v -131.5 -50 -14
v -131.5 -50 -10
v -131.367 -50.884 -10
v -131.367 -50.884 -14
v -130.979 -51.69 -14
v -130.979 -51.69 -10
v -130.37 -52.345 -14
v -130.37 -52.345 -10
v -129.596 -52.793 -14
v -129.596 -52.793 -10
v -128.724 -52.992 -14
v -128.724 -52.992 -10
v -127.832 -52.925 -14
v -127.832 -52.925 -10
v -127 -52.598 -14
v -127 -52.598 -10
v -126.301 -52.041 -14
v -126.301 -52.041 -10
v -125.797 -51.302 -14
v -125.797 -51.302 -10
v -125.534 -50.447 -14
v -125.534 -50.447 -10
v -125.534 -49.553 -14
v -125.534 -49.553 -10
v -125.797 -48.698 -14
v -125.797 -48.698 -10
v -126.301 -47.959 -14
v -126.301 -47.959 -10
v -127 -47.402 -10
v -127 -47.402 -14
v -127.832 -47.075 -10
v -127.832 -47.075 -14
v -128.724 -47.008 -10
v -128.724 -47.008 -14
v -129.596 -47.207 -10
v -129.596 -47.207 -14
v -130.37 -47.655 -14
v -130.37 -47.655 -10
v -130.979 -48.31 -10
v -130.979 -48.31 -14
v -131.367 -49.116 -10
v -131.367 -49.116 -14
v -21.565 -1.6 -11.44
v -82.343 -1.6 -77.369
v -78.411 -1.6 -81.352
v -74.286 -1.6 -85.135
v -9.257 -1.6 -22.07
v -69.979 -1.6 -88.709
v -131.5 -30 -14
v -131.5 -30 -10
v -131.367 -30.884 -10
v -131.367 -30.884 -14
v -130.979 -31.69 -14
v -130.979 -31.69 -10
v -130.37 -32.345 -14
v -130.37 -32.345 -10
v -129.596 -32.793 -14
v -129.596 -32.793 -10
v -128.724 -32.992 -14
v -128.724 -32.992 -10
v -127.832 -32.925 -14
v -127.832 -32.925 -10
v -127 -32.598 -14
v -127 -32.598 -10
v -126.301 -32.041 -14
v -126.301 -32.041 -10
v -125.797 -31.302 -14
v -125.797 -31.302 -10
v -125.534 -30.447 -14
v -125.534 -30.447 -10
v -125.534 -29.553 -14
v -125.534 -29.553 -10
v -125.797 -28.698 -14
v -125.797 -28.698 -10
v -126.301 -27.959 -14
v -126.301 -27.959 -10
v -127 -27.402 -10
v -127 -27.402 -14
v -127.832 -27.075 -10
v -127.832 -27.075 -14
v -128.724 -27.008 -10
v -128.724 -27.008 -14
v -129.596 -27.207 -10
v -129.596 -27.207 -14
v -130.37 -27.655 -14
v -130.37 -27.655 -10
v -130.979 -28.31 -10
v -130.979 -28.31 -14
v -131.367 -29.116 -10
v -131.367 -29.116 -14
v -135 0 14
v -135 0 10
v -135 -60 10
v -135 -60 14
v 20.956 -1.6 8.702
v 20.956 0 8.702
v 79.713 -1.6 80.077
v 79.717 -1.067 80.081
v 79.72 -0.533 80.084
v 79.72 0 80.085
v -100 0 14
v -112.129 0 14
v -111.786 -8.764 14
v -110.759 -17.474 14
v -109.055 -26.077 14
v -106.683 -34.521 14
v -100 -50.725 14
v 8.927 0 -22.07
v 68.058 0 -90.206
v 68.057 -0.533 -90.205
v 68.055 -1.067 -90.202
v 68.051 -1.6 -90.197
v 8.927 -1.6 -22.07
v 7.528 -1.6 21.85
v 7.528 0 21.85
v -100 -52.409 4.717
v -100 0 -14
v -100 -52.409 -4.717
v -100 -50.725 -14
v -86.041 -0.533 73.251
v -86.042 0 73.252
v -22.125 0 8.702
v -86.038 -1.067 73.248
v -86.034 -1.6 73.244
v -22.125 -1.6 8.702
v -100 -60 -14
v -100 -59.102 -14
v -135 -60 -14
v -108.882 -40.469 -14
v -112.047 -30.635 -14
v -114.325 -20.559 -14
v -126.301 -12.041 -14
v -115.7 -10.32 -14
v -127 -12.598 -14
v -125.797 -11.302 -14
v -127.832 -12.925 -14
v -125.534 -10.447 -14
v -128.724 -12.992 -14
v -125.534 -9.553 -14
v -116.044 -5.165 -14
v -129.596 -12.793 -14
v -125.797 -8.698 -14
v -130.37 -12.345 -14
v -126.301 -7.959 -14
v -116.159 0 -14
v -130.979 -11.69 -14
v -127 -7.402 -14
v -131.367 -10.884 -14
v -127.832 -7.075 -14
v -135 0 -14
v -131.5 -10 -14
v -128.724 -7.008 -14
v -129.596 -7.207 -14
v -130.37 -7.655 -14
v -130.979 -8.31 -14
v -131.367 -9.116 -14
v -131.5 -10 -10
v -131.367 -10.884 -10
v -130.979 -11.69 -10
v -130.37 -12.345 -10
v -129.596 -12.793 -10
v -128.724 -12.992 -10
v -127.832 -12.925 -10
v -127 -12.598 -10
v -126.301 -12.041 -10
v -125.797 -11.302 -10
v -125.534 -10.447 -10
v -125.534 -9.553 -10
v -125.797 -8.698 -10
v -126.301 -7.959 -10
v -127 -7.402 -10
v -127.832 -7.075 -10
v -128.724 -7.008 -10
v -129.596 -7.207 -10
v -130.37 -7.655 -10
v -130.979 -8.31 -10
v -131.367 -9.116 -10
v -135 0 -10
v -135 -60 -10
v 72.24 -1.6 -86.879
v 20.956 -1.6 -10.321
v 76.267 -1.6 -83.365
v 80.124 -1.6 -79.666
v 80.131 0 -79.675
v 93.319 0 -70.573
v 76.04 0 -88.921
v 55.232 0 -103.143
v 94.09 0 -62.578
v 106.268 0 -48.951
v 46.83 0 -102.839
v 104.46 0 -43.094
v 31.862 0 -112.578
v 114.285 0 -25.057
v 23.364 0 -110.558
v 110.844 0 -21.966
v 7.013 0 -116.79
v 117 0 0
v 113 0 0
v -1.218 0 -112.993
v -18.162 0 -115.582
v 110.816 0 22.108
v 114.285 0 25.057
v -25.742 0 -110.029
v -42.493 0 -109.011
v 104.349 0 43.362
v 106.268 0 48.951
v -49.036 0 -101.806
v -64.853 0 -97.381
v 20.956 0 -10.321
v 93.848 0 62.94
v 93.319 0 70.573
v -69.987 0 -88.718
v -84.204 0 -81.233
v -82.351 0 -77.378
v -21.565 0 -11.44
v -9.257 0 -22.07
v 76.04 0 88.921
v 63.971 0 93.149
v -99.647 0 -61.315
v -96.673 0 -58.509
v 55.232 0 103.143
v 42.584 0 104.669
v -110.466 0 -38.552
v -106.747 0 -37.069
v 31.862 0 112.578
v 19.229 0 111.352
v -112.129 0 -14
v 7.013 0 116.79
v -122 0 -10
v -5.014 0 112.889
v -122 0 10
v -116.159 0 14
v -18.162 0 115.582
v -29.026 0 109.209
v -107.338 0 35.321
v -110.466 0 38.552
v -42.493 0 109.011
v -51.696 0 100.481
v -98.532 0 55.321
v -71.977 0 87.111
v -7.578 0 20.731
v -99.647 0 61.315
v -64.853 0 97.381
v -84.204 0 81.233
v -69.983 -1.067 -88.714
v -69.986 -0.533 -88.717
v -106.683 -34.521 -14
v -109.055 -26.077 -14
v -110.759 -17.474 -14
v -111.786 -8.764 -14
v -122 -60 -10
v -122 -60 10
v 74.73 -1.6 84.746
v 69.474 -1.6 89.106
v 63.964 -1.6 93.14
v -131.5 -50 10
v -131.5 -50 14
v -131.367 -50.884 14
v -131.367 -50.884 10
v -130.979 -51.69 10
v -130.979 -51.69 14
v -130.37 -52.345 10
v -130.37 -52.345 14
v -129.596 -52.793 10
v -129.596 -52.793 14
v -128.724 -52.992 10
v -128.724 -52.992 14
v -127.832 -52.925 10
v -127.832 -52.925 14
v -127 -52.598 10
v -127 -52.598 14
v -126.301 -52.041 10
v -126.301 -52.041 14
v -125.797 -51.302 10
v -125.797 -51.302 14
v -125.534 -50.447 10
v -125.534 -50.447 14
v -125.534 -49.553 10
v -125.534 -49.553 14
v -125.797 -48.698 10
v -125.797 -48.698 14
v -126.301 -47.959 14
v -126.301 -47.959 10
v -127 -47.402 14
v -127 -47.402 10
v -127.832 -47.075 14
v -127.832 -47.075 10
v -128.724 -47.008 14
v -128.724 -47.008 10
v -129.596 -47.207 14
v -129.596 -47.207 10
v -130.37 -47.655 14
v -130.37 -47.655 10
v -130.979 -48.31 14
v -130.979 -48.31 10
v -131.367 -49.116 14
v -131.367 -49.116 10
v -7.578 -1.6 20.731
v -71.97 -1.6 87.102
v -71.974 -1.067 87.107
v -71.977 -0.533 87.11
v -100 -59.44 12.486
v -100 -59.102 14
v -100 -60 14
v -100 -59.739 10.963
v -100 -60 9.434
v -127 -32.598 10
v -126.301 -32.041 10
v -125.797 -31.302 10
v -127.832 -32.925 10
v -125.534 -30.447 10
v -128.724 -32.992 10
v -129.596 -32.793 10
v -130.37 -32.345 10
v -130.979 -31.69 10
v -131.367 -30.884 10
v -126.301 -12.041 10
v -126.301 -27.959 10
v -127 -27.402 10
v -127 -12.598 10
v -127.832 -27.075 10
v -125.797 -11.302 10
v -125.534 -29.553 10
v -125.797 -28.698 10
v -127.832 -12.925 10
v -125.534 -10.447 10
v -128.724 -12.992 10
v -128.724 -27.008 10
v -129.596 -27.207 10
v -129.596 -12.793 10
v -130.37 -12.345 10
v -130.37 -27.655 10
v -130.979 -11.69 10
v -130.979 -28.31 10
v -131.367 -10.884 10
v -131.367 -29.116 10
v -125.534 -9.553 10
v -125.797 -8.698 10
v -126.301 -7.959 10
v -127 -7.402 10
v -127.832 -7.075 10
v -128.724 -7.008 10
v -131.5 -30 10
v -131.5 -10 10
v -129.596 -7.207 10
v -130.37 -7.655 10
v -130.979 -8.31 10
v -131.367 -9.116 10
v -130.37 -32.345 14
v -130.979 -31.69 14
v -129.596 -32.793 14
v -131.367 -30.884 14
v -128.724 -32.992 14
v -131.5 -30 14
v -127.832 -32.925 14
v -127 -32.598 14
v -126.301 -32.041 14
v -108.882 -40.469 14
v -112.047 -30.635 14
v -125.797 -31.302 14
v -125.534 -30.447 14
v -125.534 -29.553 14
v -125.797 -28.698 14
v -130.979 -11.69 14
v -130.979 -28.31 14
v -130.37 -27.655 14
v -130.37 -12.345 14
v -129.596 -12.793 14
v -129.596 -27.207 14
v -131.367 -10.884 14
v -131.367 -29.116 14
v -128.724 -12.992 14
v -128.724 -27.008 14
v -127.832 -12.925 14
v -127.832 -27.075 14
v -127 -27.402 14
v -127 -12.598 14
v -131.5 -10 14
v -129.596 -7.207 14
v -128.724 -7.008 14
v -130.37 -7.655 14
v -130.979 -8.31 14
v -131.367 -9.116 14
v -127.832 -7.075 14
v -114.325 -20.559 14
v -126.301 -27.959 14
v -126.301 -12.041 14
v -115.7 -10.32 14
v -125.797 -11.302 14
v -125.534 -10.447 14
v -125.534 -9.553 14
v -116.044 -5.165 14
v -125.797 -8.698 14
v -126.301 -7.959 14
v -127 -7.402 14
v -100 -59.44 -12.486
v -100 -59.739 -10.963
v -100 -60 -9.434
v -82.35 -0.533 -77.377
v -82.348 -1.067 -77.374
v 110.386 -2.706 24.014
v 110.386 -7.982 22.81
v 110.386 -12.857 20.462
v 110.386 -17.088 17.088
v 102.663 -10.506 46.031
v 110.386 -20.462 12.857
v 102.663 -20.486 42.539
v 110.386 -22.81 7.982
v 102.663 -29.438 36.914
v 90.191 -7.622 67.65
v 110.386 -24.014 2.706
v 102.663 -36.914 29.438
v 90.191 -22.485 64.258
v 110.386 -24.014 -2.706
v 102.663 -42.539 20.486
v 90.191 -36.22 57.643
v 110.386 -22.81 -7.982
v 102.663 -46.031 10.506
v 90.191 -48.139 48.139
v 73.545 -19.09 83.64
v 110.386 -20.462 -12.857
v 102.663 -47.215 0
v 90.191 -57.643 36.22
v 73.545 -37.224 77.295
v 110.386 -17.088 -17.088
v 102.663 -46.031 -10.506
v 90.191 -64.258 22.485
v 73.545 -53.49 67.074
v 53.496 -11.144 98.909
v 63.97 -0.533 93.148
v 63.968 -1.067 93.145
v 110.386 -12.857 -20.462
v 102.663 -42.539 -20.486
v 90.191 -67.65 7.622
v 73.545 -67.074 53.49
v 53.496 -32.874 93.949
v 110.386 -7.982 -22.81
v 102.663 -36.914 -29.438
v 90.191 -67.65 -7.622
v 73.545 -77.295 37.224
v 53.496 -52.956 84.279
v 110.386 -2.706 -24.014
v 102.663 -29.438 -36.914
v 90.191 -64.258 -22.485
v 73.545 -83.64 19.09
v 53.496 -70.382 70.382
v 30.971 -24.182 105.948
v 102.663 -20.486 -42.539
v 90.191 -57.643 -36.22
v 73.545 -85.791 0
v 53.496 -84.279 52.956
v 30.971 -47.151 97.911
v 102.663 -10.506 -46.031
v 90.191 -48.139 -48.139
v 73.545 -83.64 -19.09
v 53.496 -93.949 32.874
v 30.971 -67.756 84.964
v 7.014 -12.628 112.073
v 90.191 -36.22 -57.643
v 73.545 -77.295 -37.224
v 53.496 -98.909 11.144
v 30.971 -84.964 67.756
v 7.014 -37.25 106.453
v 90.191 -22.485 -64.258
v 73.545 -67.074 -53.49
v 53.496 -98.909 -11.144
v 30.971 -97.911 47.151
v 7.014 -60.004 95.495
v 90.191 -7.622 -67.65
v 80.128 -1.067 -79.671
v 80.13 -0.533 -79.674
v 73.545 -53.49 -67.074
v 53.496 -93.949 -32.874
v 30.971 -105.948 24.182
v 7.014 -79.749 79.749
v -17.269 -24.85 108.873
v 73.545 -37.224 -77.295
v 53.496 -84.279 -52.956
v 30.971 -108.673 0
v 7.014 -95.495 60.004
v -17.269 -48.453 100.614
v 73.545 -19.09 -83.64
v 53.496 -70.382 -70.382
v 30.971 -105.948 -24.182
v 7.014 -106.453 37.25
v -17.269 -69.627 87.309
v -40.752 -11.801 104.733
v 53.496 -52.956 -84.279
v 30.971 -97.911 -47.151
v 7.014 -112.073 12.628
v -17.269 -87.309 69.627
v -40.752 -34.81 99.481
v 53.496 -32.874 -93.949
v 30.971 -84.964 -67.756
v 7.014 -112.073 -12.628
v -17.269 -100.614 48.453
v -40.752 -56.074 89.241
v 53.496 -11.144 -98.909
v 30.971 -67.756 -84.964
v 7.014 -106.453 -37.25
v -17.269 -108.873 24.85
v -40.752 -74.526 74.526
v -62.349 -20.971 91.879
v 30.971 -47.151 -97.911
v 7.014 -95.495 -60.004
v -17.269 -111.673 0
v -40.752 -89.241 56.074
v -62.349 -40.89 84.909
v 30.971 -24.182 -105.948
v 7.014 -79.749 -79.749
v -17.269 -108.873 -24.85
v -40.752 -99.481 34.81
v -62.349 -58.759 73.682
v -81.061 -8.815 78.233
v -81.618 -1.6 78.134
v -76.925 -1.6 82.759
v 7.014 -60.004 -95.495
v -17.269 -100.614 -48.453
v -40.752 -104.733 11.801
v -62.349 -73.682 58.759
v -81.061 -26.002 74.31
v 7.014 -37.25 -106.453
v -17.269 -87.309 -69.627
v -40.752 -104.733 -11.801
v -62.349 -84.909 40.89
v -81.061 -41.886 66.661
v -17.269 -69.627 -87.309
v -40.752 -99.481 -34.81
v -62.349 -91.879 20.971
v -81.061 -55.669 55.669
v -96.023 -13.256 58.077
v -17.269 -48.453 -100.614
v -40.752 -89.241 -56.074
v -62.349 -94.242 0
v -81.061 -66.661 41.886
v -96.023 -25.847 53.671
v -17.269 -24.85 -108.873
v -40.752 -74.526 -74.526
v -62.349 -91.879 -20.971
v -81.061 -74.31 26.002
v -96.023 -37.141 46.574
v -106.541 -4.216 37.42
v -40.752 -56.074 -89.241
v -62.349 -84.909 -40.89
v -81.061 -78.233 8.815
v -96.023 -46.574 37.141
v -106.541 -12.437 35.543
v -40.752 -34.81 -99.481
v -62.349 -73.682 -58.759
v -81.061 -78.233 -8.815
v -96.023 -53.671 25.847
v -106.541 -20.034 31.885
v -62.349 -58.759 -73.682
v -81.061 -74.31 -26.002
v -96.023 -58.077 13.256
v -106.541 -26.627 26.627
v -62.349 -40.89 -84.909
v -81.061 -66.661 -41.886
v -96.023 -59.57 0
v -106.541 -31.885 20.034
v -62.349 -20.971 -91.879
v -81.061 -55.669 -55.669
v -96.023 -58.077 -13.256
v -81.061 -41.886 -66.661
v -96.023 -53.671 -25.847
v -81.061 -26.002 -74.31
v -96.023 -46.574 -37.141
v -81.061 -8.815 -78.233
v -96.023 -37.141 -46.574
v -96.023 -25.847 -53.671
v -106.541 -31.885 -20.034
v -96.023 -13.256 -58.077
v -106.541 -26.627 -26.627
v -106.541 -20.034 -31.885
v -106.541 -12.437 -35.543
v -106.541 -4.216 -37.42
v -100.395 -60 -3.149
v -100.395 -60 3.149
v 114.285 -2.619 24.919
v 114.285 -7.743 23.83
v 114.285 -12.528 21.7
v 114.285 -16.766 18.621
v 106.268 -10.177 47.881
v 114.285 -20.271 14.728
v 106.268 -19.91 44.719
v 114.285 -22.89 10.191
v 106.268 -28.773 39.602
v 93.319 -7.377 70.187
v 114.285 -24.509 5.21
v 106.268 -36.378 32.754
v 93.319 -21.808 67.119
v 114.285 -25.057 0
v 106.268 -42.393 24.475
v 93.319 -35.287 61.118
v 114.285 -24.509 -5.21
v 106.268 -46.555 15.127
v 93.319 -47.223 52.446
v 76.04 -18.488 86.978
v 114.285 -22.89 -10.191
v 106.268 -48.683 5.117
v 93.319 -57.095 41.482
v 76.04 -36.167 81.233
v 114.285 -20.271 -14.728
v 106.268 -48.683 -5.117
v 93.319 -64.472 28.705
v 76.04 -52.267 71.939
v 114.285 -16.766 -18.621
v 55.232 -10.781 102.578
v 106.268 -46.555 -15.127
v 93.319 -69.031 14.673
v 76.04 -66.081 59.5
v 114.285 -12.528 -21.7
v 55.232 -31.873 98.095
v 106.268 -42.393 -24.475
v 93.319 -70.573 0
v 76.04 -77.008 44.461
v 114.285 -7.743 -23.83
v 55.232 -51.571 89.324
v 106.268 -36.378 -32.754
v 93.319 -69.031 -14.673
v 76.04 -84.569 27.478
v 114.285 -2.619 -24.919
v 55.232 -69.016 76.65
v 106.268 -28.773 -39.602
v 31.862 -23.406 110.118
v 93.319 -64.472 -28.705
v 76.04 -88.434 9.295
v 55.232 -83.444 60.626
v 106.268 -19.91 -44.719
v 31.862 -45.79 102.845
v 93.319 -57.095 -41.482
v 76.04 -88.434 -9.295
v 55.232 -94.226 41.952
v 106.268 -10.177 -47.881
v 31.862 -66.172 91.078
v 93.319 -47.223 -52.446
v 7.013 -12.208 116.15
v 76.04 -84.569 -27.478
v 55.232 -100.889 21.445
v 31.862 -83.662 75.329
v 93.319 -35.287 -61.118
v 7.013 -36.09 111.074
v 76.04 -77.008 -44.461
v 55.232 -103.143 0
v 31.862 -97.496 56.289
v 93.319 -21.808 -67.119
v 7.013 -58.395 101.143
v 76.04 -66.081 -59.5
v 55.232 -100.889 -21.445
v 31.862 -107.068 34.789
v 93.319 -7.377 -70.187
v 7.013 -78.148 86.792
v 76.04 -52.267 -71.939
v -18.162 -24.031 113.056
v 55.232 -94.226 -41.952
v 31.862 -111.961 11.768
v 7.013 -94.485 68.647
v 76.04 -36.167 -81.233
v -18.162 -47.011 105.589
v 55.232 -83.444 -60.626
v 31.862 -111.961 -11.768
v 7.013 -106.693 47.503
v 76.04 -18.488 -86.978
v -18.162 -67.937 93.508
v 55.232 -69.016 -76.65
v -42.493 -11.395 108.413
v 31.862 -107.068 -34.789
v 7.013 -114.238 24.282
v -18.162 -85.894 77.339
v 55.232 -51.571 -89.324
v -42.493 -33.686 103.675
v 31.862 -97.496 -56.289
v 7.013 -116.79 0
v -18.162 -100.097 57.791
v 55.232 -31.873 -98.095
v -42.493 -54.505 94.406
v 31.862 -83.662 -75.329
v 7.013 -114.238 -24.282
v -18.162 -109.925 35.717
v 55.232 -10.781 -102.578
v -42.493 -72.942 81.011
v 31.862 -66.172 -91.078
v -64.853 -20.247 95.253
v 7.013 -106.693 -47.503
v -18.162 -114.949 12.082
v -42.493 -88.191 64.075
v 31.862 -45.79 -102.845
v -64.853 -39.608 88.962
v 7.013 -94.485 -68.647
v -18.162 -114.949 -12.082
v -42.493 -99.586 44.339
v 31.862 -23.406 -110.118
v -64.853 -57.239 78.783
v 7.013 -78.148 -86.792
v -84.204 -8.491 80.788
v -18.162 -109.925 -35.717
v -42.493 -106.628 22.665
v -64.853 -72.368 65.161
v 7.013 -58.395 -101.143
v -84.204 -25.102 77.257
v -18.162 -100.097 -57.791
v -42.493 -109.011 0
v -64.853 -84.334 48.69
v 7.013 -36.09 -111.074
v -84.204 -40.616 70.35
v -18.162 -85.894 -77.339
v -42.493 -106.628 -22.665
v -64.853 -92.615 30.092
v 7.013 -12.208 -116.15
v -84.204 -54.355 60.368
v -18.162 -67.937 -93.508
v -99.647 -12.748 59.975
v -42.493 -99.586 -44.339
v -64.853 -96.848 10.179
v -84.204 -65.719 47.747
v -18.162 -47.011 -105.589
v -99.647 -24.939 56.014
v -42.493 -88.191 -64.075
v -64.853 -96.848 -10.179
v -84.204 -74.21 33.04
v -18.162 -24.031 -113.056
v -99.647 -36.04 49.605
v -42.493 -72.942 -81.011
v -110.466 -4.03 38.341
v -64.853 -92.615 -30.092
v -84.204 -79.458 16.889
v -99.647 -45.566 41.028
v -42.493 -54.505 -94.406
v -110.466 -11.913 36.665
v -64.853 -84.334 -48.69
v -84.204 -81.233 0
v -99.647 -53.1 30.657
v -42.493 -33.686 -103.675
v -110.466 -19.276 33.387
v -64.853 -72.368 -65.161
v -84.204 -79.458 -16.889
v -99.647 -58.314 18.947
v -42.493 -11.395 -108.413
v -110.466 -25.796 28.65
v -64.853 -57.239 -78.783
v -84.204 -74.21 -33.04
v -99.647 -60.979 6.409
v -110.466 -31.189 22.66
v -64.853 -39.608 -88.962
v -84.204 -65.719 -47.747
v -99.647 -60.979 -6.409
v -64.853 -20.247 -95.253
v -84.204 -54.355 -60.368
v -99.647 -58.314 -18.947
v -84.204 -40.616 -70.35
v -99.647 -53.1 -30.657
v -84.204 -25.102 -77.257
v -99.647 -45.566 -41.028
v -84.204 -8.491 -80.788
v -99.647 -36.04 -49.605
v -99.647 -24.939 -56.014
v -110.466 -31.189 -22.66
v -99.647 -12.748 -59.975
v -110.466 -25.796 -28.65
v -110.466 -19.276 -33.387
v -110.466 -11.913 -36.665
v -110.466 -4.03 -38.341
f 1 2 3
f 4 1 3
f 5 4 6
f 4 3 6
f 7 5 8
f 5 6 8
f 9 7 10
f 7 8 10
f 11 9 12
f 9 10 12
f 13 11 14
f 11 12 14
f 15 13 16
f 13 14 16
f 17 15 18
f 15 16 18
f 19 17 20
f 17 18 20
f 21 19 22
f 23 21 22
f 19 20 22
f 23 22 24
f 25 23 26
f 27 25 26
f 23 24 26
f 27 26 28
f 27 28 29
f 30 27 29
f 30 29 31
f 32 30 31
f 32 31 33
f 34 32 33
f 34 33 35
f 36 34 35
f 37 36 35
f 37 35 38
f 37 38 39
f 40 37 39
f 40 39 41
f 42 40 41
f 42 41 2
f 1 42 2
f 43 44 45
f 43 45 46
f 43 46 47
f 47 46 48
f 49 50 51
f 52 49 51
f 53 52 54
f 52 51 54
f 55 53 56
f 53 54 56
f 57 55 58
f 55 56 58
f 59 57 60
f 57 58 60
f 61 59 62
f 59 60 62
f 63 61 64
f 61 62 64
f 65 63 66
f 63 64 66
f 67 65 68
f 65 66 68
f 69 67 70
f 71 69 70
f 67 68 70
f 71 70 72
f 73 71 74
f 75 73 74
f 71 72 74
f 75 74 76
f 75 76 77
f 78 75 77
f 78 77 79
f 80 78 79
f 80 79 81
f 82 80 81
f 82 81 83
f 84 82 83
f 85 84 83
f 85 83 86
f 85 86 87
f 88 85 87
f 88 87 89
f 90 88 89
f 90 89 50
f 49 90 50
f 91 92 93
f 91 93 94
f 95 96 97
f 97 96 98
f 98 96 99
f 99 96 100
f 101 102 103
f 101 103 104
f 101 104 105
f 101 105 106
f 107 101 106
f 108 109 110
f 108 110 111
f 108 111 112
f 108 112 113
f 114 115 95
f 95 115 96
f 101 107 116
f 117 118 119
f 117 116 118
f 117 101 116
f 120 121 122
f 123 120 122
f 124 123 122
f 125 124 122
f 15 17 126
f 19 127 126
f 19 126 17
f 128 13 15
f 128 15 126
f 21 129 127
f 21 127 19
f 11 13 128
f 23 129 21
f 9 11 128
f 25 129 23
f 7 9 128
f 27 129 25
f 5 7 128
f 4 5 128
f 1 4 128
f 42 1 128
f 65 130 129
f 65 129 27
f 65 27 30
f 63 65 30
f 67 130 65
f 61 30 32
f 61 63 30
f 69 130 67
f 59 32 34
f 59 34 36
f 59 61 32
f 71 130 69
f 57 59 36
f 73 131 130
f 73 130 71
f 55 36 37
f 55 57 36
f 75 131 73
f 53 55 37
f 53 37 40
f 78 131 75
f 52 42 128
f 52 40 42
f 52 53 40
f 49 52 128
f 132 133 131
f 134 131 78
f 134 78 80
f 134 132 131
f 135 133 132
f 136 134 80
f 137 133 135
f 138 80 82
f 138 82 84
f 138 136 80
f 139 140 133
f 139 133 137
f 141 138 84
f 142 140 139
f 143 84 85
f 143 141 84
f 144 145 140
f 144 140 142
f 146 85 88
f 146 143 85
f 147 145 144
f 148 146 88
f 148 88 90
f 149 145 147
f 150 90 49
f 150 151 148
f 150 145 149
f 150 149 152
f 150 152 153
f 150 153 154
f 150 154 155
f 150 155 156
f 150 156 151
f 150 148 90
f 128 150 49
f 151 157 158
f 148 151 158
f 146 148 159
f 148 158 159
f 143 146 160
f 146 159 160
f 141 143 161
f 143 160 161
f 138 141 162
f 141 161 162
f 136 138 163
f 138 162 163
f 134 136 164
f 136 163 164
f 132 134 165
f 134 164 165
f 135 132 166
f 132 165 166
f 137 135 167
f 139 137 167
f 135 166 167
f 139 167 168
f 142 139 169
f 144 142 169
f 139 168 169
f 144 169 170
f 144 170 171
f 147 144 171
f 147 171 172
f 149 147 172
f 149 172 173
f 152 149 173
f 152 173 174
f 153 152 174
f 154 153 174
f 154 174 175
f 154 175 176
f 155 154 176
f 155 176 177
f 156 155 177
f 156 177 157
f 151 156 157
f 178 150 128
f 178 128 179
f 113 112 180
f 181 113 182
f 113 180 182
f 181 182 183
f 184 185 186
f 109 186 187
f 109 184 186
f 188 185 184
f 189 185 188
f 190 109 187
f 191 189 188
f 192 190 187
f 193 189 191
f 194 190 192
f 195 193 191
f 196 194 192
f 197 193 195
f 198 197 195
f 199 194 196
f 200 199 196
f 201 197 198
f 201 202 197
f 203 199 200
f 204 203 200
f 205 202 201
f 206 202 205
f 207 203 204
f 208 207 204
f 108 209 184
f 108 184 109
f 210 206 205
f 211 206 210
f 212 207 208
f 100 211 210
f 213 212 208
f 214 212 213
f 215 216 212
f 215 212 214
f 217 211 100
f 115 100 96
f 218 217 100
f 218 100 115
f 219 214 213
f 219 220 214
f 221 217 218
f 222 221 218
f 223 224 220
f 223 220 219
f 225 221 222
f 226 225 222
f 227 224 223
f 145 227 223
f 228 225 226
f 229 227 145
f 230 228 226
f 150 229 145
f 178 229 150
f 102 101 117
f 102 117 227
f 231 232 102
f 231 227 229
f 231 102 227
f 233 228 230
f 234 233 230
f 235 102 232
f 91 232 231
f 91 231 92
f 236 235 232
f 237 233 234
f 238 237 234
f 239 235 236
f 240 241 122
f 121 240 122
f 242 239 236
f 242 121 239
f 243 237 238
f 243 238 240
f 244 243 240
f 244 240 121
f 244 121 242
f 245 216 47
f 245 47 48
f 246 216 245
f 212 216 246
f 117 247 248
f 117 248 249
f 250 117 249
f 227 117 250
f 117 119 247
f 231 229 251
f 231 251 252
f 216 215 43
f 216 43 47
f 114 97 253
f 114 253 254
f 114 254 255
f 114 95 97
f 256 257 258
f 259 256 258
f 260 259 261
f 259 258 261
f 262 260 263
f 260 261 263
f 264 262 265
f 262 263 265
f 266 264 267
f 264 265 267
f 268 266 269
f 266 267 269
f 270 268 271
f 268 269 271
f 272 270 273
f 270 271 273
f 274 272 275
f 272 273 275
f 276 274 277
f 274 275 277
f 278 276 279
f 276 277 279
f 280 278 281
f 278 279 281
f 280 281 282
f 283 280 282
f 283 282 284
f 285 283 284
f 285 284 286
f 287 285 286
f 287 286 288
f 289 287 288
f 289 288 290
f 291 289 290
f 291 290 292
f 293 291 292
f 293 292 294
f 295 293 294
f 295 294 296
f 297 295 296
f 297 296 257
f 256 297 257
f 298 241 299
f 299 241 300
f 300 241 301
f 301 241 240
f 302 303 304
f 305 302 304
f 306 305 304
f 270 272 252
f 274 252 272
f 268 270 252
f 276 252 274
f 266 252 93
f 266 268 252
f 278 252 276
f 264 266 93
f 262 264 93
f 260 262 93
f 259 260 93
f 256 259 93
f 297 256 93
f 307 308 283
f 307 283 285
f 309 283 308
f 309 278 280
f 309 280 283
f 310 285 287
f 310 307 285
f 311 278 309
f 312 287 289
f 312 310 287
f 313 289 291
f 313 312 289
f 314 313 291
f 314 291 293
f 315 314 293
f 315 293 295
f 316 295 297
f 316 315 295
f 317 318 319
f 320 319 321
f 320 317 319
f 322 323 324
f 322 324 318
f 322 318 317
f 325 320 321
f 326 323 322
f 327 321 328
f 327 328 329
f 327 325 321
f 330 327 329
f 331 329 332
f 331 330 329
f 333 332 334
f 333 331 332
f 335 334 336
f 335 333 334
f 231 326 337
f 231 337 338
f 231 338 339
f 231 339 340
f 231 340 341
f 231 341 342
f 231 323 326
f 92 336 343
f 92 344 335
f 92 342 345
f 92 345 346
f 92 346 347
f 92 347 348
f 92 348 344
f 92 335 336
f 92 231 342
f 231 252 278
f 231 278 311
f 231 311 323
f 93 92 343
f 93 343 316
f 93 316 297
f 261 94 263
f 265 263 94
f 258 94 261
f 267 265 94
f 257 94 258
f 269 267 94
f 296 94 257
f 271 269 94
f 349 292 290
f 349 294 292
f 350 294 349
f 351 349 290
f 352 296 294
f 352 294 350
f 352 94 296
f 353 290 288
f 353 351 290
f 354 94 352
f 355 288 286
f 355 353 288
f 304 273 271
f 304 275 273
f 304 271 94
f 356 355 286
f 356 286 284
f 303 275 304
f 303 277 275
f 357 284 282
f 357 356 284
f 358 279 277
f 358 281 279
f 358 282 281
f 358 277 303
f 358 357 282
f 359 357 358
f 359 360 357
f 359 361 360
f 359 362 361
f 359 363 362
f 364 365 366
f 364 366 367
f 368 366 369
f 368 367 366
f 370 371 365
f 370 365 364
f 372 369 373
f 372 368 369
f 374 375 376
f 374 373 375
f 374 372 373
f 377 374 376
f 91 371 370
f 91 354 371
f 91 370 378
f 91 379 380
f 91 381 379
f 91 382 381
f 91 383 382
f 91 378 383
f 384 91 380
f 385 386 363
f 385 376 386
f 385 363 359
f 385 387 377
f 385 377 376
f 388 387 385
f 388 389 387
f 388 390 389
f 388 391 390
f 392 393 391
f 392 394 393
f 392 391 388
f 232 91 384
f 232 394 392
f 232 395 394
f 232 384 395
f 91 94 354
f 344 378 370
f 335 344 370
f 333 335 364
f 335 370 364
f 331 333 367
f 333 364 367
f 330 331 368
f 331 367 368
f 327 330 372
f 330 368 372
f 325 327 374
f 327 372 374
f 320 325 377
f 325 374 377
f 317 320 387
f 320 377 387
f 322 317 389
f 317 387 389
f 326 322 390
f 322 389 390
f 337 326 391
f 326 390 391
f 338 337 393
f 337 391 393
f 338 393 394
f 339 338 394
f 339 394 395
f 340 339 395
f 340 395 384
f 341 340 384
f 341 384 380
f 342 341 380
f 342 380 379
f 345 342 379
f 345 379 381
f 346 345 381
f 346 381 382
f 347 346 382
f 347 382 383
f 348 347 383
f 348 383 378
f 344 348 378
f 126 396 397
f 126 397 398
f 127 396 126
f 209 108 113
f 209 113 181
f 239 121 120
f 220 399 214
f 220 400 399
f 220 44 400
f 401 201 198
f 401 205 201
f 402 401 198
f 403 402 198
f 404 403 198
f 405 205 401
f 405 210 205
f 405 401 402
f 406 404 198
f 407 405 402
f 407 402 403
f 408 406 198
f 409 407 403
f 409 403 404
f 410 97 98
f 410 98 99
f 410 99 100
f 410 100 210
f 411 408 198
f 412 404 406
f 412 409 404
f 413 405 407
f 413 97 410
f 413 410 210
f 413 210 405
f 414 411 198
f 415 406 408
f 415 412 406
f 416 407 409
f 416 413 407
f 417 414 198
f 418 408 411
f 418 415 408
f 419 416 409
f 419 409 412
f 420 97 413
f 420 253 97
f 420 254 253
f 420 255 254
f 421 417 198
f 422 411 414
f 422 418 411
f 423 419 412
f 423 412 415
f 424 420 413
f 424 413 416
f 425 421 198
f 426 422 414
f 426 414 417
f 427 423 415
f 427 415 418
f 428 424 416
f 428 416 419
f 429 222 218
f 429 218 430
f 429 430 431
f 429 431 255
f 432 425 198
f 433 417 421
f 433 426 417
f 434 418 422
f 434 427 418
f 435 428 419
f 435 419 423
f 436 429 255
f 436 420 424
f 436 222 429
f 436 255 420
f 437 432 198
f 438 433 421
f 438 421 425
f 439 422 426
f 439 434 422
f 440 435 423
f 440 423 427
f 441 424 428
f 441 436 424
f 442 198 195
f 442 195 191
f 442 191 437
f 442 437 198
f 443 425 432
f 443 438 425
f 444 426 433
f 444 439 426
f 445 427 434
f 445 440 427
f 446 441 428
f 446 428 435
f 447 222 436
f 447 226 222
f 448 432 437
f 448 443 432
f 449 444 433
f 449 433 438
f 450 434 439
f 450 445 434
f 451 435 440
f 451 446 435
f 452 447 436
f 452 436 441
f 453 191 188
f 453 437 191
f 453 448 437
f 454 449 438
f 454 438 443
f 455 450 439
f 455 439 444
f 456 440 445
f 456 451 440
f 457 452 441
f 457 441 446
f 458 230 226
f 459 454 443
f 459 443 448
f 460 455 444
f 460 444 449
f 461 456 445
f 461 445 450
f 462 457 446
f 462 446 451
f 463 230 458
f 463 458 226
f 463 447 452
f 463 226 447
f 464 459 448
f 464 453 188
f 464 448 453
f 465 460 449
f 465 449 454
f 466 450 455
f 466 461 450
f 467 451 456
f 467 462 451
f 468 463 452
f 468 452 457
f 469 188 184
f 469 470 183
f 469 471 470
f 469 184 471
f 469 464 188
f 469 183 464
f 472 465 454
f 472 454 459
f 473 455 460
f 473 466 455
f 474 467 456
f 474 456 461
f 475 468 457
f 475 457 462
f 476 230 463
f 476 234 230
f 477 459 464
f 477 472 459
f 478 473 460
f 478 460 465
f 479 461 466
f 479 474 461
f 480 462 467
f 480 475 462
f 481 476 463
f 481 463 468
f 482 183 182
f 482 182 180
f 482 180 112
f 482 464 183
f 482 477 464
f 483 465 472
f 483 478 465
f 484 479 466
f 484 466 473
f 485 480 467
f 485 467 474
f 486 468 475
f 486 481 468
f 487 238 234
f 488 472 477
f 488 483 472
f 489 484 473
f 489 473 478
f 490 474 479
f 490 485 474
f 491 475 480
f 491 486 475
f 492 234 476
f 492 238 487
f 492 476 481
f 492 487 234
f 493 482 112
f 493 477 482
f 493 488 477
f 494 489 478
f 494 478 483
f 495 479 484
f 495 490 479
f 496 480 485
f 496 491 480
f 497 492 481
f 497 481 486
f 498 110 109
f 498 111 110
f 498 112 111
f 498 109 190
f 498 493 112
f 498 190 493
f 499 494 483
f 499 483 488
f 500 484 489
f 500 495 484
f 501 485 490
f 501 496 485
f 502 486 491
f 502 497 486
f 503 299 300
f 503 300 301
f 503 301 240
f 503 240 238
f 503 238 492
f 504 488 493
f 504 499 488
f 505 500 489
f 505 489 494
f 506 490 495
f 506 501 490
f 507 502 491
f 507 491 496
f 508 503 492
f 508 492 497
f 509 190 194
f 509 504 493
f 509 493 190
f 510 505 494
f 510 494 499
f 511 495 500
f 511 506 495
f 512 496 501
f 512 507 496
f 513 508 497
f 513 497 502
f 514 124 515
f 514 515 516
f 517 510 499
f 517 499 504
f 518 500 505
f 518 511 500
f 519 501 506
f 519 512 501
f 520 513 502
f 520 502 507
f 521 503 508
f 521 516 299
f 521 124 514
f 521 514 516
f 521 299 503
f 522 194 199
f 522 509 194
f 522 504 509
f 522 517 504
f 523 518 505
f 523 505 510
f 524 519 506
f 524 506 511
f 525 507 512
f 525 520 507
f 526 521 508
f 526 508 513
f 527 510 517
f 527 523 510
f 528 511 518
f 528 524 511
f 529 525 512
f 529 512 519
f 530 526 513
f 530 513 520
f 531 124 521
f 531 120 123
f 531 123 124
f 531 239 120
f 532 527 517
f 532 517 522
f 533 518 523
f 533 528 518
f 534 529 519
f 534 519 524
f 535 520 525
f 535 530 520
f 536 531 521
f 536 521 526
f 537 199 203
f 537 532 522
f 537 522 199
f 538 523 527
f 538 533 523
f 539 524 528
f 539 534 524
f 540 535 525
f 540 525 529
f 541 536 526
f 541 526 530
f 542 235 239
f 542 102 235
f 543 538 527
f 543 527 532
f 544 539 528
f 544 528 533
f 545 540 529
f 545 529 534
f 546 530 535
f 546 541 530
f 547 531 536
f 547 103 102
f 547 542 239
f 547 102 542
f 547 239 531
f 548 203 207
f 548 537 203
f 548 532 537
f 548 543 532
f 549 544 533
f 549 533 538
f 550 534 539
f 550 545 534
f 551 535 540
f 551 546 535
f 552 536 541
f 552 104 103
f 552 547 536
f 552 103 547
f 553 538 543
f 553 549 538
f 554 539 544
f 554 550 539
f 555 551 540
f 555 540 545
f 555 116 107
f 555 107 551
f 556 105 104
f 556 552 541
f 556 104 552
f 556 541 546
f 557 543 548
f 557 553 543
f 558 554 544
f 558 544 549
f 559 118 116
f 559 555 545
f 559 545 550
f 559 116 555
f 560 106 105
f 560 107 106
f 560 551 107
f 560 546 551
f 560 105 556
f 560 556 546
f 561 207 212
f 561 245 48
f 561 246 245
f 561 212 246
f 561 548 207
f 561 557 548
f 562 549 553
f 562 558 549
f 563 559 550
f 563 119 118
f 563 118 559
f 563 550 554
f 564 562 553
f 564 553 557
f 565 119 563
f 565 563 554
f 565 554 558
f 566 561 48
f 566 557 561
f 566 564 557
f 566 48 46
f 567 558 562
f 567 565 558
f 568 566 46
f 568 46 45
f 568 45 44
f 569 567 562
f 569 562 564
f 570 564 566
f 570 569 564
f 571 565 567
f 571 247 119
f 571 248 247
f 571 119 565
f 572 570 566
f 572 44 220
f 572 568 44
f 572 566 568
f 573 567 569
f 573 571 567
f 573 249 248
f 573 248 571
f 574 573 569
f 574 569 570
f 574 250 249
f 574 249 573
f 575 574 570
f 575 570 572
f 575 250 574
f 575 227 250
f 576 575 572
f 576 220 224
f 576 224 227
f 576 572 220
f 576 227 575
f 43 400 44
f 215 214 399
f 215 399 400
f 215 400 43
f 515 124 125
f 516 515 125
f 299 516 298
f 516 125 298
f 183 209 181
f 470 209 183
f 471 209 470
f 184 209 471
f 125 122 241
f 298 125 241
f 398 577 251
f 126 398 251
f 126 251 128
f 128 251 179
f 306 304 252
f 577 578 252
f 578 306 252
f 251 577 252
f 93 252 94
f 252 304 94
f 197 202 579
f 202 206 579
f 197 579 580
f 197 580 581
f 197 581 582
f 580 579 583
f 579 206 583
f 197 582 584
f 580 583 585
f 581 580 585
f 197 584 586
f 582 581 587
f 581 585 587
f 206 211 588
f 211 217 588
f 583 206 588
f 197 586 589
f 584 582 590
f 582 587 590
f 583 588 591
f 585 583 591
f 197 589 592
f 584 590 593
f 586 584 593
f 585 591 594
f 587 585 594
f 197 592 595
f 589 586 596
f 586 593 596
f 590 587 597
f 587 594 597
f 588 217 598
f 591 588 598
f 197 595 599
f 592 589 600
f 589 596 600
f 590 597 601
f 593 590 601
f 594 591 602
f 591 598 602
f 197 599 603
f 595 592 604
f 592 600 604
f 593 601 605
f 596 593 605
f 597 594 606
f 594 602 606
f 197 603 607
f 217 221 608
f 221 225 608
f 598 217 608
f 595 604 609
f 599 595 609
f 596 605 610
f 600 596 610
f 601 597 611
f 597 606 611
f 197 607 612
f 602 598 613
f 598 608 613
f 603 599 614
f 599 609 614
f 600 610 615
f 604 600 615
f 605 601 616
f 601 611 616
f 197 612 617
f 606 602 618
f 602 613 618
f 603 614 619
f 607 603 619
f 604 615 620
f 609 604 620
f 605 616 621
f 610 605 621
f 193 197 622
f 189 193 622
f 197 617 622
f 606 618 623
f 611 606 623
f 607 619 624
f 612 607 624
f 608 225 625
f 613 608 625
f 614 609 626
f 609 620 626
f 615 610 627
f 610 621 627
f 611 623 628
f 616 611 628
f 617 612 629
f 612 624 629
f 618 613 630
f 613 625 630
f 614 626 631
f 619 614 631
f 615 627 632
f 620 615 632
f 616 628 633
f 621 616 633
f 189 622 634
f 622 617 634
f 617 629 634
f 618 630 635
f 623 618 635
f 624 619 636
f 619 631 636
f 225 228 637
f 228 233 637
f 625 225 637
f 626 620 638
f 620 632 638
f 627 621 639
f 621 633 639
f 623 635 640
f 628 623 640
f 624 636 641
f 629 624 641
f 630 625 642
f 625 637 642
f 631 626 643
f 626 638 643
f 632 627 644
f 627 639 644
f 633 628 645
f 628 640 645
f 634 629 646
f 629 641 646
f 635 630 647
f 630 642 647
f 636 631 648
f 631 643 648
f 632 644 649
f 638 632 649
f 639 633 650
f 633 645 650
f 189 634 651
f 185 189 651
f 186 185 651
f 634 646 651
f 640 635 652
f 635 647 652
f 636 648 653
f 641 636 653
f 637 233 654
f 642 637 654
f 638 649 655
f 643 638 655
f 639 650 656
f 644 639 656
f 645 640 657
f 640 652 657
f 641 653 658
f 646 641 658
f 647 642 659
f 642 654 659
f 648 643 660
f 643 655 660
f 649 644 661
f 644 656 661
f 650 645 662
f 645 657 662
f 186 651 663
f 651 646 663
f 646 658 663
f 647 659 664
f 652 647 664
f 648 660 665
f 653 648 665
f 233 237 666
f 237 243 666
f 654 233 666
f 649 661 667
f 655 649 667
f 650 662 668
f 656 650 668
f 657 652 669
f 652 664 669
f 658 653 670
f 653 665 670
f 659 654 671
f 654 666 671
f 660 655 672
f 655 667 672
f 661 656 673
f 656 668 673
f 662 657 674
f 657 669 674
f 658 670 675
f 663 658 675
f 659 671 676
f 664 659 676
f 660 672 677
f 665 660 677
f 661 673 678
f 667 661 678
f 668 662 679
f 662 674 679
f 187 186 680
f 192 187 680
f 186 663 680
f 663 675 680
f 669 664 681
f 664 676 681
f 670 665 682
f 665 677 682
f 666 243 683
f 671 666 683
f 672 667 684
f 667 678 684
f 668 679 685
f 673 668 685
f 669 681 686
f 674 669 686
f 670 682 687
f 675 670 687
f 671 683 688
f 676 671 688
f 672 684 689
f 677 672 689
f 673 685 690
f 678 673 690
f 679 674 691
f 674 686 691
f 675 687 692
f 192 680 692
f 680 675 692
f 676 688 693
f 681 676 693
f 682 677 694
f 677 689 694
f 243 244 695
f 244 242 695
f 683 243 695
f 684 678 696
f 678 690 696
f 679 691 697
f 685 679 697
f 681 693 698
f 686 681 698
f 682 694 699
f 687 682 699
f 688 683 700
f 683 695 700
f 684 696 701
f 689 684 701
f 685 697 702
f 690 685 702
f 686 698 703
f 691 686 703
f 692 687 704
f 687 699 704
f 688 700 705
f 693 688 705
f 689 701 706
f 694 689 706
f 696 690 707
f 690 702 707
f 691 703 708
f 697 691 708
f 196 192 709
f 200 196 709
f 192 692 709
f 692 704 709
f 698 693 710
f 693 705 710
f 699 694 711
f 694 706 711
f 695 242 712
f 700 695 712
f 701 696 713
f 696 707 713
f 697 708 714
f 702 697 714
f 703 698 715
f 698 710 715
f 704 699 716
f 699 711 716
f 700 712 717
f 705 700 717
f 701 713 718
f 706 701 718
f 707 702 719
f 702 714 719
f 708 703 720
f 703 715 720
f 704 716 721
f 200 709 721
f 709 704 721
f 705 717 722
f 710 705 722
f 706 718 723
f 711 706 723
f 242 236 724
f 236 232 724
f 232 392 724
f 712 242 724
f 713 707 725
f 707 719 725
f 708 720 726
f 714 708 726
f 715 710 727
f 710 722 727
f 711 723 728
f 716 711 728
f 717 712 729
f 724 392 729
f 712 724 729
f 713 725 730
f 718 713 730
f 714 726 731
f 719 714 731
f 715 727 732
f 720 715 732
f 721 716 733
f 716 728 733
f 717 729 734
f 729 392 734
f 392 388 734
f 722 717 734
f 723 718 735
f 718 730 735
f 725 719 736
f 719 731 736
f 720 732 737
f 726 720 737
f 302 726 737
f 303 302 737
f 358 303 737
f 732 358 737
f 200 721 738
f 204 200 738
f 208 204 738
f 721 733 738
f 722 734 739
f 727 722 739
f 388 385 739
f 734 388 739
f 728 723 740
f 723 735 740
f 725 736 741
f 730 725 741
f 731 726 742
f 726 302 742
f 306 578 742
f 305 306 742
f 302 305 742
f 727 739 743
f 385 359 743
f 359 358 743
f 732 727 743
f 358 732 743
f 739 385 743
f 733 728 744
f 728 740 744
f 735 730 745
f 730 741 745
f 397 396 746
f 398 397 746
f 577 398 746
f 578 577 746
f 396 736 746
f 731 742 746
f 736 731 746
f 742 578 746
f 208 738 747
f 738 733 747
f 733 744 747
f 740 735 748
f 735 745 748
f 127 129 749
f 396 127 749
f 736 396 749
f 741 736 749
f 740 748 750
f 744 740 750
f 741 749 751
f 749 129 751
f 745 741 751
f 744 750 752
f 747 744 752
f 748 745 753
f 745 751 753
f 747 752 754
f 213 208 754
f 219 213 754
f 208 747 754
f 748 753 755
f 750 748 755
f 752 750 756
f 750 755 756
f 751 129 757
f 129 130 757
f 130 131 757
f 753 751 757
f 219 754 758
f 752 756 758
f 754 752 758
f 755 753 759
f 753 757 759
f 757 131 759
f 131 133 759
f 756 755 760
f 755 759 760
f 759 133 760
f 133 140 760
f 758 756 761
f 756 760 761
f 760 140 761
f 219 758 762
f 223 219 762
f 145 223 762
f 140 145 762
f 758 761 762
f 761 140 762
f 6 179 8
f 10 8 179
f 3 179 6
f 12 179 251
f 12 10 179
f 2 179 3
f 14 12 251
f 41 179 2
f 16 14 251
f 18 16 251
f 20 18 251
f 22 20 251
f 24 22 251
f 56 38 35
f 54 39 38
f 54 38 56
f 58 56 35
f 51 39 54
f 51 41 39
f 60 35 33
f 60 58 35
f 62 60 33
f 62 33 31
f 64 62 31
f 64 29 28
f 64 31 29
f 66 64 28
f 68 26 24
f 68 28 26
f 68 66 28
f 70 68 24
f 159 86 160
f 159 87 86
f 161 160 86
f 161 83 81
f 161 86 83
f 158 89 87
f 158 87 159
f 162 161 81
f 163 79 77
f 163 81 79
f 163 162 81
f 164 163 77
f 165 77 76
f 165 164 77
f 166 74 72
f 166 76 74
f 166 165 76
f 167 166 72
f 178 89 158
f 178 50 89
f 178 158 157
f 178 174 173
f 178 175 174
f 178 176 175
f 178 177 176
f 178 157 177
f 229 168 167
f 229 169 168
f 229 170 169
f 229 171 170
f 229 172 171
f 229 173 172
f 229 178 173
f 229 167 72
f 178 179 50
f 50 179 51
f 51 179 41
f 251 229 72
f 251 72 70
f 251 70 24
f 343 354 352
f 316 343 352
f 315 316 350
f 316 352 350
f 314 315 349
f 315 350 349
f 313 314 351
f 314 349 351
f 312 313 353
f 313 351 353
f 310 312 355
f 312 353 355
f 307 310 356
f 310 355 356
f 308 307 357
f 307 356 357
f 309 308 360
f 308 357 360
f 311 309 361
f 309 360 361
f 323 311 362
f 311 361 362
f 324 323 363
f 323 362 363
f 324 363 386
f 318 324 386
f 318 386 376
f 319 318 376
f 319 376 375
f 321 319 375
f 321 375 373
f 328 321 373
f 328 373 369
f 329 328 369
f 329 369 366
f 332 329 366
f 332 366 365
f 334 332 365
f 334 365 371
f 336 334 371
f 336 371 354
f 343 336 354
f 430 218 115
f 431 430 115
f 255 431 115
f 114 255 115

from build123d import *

# Parameters (mm, degrees)
REVOLUTION_ANGLE = 180
PAD_DEPTH        = 60
SKETCH002_R      = 3
HOLE_DEPTH       = 131.001
PAD001_DEPTH     = 1.6


with BuildPart() as part:
    # Sketch → Revolution (revolve)
    with BuildSketch(Plane.XZ):
        with BuildLine():
            ThreePointArc((117, 0), (0, 117), (-117, 0))
            Line((-117, 0), (-113, 0))
            ThreePointArc((113, 0), (0, 113), (-113, 0))
            Line((113, 0), (117, 0))
        make_face()
    revolve(axis=Axis((0, 0, 0), (1, 0, 0)), revolution_arc=REVOLUTION_ANGLE)

    # Sketch001 → Pad (new body)
    with BuildSketch(Plane.XZ):
        Polygon((-100, 14), (-100, -14), (-135, -14), (-135, -10), (-122, -10), (-122, 10), (-135, 10), (-135, 14), align=None)
    extrude(amount=PAD_DEPTH)

    # Sketch002 (on Face3 of Pad) → Hole (cut, through all)
    with BuildSketch(Plane(origin=(0, 0, 14), x_dir=(-1, 0, 0), z_dir=(0, 0, 1))):
        with Locations((128.5, 10)):
            Circle(SKETCH002_R)
        with Locations((128.5, 30)):
            Circle(SKETCH002_R)
        with Locations((128.5, 50)):
            Circle(SKETCH002_R)
    extrude(amount=-HOLE_DEPTH, mode=Mode.SUBTRACT)

    # Sketch003 → Pad001 (join)
    with BuildSketch(Plane(origin=(0, 0, 0), x_dir=(1, 0, 0), z_dir=(0, 1, 0))):
        with BuildLine():
            ThreePointArc((-87.124586, -74.345171), (-80.386247, -81.584001), (-73.048555, -88.214548))
            Line((-7.578152, -20.730836), (-73.048555, -88.214548))
            Line((-22.124763, -8.701903), (-7.578152, -20.730836))
            Line((-87.124586, -74.345171), (-22.124763, -8.701903))
        make_face()
        with BuildLine():
            Line((-83.392932, 78.508068), (-21.565299, 11.439582))
            Line((-21.565299, 11.439582), (-9.256599, 22.06979))
            Line((-9.256599, 22.06979), (-71.022068, 89.854125))
            ThreePointArc((-71.022068, 89.854125), (-77.41564, 84.408036), (-83.392932, 78.508068))
        make_face()
        with BuildLine():
            Line((69.065471, 91.366617), (8.92667, 22.06979))
            Line((8.92667, 22.06979), (20.955595, 10.320597))
            Line((20.955595, 10.320597), (81.129513, 80.844913))
            ThreePointArc((81.129513, 80.844913), (75.281537, 86.316789), (69.065471, 91.366617))
        make_face()
        with BuildLine():
            Line((64.925001, -94.353813), (7.527937, -21.849806))
            Line((7.527937, -21.849806), (20.955578, -8.701903))
            Line((20.955578, -8.701903), (80.699204, -81.274451))
            ThreePointArc((64.925001, -94.353813), (73.105196, -88.167614), (80.699204, -81.274451))
        make_face()
    extrude(amount=-PAD001_DEPTH)


solid = part.part
